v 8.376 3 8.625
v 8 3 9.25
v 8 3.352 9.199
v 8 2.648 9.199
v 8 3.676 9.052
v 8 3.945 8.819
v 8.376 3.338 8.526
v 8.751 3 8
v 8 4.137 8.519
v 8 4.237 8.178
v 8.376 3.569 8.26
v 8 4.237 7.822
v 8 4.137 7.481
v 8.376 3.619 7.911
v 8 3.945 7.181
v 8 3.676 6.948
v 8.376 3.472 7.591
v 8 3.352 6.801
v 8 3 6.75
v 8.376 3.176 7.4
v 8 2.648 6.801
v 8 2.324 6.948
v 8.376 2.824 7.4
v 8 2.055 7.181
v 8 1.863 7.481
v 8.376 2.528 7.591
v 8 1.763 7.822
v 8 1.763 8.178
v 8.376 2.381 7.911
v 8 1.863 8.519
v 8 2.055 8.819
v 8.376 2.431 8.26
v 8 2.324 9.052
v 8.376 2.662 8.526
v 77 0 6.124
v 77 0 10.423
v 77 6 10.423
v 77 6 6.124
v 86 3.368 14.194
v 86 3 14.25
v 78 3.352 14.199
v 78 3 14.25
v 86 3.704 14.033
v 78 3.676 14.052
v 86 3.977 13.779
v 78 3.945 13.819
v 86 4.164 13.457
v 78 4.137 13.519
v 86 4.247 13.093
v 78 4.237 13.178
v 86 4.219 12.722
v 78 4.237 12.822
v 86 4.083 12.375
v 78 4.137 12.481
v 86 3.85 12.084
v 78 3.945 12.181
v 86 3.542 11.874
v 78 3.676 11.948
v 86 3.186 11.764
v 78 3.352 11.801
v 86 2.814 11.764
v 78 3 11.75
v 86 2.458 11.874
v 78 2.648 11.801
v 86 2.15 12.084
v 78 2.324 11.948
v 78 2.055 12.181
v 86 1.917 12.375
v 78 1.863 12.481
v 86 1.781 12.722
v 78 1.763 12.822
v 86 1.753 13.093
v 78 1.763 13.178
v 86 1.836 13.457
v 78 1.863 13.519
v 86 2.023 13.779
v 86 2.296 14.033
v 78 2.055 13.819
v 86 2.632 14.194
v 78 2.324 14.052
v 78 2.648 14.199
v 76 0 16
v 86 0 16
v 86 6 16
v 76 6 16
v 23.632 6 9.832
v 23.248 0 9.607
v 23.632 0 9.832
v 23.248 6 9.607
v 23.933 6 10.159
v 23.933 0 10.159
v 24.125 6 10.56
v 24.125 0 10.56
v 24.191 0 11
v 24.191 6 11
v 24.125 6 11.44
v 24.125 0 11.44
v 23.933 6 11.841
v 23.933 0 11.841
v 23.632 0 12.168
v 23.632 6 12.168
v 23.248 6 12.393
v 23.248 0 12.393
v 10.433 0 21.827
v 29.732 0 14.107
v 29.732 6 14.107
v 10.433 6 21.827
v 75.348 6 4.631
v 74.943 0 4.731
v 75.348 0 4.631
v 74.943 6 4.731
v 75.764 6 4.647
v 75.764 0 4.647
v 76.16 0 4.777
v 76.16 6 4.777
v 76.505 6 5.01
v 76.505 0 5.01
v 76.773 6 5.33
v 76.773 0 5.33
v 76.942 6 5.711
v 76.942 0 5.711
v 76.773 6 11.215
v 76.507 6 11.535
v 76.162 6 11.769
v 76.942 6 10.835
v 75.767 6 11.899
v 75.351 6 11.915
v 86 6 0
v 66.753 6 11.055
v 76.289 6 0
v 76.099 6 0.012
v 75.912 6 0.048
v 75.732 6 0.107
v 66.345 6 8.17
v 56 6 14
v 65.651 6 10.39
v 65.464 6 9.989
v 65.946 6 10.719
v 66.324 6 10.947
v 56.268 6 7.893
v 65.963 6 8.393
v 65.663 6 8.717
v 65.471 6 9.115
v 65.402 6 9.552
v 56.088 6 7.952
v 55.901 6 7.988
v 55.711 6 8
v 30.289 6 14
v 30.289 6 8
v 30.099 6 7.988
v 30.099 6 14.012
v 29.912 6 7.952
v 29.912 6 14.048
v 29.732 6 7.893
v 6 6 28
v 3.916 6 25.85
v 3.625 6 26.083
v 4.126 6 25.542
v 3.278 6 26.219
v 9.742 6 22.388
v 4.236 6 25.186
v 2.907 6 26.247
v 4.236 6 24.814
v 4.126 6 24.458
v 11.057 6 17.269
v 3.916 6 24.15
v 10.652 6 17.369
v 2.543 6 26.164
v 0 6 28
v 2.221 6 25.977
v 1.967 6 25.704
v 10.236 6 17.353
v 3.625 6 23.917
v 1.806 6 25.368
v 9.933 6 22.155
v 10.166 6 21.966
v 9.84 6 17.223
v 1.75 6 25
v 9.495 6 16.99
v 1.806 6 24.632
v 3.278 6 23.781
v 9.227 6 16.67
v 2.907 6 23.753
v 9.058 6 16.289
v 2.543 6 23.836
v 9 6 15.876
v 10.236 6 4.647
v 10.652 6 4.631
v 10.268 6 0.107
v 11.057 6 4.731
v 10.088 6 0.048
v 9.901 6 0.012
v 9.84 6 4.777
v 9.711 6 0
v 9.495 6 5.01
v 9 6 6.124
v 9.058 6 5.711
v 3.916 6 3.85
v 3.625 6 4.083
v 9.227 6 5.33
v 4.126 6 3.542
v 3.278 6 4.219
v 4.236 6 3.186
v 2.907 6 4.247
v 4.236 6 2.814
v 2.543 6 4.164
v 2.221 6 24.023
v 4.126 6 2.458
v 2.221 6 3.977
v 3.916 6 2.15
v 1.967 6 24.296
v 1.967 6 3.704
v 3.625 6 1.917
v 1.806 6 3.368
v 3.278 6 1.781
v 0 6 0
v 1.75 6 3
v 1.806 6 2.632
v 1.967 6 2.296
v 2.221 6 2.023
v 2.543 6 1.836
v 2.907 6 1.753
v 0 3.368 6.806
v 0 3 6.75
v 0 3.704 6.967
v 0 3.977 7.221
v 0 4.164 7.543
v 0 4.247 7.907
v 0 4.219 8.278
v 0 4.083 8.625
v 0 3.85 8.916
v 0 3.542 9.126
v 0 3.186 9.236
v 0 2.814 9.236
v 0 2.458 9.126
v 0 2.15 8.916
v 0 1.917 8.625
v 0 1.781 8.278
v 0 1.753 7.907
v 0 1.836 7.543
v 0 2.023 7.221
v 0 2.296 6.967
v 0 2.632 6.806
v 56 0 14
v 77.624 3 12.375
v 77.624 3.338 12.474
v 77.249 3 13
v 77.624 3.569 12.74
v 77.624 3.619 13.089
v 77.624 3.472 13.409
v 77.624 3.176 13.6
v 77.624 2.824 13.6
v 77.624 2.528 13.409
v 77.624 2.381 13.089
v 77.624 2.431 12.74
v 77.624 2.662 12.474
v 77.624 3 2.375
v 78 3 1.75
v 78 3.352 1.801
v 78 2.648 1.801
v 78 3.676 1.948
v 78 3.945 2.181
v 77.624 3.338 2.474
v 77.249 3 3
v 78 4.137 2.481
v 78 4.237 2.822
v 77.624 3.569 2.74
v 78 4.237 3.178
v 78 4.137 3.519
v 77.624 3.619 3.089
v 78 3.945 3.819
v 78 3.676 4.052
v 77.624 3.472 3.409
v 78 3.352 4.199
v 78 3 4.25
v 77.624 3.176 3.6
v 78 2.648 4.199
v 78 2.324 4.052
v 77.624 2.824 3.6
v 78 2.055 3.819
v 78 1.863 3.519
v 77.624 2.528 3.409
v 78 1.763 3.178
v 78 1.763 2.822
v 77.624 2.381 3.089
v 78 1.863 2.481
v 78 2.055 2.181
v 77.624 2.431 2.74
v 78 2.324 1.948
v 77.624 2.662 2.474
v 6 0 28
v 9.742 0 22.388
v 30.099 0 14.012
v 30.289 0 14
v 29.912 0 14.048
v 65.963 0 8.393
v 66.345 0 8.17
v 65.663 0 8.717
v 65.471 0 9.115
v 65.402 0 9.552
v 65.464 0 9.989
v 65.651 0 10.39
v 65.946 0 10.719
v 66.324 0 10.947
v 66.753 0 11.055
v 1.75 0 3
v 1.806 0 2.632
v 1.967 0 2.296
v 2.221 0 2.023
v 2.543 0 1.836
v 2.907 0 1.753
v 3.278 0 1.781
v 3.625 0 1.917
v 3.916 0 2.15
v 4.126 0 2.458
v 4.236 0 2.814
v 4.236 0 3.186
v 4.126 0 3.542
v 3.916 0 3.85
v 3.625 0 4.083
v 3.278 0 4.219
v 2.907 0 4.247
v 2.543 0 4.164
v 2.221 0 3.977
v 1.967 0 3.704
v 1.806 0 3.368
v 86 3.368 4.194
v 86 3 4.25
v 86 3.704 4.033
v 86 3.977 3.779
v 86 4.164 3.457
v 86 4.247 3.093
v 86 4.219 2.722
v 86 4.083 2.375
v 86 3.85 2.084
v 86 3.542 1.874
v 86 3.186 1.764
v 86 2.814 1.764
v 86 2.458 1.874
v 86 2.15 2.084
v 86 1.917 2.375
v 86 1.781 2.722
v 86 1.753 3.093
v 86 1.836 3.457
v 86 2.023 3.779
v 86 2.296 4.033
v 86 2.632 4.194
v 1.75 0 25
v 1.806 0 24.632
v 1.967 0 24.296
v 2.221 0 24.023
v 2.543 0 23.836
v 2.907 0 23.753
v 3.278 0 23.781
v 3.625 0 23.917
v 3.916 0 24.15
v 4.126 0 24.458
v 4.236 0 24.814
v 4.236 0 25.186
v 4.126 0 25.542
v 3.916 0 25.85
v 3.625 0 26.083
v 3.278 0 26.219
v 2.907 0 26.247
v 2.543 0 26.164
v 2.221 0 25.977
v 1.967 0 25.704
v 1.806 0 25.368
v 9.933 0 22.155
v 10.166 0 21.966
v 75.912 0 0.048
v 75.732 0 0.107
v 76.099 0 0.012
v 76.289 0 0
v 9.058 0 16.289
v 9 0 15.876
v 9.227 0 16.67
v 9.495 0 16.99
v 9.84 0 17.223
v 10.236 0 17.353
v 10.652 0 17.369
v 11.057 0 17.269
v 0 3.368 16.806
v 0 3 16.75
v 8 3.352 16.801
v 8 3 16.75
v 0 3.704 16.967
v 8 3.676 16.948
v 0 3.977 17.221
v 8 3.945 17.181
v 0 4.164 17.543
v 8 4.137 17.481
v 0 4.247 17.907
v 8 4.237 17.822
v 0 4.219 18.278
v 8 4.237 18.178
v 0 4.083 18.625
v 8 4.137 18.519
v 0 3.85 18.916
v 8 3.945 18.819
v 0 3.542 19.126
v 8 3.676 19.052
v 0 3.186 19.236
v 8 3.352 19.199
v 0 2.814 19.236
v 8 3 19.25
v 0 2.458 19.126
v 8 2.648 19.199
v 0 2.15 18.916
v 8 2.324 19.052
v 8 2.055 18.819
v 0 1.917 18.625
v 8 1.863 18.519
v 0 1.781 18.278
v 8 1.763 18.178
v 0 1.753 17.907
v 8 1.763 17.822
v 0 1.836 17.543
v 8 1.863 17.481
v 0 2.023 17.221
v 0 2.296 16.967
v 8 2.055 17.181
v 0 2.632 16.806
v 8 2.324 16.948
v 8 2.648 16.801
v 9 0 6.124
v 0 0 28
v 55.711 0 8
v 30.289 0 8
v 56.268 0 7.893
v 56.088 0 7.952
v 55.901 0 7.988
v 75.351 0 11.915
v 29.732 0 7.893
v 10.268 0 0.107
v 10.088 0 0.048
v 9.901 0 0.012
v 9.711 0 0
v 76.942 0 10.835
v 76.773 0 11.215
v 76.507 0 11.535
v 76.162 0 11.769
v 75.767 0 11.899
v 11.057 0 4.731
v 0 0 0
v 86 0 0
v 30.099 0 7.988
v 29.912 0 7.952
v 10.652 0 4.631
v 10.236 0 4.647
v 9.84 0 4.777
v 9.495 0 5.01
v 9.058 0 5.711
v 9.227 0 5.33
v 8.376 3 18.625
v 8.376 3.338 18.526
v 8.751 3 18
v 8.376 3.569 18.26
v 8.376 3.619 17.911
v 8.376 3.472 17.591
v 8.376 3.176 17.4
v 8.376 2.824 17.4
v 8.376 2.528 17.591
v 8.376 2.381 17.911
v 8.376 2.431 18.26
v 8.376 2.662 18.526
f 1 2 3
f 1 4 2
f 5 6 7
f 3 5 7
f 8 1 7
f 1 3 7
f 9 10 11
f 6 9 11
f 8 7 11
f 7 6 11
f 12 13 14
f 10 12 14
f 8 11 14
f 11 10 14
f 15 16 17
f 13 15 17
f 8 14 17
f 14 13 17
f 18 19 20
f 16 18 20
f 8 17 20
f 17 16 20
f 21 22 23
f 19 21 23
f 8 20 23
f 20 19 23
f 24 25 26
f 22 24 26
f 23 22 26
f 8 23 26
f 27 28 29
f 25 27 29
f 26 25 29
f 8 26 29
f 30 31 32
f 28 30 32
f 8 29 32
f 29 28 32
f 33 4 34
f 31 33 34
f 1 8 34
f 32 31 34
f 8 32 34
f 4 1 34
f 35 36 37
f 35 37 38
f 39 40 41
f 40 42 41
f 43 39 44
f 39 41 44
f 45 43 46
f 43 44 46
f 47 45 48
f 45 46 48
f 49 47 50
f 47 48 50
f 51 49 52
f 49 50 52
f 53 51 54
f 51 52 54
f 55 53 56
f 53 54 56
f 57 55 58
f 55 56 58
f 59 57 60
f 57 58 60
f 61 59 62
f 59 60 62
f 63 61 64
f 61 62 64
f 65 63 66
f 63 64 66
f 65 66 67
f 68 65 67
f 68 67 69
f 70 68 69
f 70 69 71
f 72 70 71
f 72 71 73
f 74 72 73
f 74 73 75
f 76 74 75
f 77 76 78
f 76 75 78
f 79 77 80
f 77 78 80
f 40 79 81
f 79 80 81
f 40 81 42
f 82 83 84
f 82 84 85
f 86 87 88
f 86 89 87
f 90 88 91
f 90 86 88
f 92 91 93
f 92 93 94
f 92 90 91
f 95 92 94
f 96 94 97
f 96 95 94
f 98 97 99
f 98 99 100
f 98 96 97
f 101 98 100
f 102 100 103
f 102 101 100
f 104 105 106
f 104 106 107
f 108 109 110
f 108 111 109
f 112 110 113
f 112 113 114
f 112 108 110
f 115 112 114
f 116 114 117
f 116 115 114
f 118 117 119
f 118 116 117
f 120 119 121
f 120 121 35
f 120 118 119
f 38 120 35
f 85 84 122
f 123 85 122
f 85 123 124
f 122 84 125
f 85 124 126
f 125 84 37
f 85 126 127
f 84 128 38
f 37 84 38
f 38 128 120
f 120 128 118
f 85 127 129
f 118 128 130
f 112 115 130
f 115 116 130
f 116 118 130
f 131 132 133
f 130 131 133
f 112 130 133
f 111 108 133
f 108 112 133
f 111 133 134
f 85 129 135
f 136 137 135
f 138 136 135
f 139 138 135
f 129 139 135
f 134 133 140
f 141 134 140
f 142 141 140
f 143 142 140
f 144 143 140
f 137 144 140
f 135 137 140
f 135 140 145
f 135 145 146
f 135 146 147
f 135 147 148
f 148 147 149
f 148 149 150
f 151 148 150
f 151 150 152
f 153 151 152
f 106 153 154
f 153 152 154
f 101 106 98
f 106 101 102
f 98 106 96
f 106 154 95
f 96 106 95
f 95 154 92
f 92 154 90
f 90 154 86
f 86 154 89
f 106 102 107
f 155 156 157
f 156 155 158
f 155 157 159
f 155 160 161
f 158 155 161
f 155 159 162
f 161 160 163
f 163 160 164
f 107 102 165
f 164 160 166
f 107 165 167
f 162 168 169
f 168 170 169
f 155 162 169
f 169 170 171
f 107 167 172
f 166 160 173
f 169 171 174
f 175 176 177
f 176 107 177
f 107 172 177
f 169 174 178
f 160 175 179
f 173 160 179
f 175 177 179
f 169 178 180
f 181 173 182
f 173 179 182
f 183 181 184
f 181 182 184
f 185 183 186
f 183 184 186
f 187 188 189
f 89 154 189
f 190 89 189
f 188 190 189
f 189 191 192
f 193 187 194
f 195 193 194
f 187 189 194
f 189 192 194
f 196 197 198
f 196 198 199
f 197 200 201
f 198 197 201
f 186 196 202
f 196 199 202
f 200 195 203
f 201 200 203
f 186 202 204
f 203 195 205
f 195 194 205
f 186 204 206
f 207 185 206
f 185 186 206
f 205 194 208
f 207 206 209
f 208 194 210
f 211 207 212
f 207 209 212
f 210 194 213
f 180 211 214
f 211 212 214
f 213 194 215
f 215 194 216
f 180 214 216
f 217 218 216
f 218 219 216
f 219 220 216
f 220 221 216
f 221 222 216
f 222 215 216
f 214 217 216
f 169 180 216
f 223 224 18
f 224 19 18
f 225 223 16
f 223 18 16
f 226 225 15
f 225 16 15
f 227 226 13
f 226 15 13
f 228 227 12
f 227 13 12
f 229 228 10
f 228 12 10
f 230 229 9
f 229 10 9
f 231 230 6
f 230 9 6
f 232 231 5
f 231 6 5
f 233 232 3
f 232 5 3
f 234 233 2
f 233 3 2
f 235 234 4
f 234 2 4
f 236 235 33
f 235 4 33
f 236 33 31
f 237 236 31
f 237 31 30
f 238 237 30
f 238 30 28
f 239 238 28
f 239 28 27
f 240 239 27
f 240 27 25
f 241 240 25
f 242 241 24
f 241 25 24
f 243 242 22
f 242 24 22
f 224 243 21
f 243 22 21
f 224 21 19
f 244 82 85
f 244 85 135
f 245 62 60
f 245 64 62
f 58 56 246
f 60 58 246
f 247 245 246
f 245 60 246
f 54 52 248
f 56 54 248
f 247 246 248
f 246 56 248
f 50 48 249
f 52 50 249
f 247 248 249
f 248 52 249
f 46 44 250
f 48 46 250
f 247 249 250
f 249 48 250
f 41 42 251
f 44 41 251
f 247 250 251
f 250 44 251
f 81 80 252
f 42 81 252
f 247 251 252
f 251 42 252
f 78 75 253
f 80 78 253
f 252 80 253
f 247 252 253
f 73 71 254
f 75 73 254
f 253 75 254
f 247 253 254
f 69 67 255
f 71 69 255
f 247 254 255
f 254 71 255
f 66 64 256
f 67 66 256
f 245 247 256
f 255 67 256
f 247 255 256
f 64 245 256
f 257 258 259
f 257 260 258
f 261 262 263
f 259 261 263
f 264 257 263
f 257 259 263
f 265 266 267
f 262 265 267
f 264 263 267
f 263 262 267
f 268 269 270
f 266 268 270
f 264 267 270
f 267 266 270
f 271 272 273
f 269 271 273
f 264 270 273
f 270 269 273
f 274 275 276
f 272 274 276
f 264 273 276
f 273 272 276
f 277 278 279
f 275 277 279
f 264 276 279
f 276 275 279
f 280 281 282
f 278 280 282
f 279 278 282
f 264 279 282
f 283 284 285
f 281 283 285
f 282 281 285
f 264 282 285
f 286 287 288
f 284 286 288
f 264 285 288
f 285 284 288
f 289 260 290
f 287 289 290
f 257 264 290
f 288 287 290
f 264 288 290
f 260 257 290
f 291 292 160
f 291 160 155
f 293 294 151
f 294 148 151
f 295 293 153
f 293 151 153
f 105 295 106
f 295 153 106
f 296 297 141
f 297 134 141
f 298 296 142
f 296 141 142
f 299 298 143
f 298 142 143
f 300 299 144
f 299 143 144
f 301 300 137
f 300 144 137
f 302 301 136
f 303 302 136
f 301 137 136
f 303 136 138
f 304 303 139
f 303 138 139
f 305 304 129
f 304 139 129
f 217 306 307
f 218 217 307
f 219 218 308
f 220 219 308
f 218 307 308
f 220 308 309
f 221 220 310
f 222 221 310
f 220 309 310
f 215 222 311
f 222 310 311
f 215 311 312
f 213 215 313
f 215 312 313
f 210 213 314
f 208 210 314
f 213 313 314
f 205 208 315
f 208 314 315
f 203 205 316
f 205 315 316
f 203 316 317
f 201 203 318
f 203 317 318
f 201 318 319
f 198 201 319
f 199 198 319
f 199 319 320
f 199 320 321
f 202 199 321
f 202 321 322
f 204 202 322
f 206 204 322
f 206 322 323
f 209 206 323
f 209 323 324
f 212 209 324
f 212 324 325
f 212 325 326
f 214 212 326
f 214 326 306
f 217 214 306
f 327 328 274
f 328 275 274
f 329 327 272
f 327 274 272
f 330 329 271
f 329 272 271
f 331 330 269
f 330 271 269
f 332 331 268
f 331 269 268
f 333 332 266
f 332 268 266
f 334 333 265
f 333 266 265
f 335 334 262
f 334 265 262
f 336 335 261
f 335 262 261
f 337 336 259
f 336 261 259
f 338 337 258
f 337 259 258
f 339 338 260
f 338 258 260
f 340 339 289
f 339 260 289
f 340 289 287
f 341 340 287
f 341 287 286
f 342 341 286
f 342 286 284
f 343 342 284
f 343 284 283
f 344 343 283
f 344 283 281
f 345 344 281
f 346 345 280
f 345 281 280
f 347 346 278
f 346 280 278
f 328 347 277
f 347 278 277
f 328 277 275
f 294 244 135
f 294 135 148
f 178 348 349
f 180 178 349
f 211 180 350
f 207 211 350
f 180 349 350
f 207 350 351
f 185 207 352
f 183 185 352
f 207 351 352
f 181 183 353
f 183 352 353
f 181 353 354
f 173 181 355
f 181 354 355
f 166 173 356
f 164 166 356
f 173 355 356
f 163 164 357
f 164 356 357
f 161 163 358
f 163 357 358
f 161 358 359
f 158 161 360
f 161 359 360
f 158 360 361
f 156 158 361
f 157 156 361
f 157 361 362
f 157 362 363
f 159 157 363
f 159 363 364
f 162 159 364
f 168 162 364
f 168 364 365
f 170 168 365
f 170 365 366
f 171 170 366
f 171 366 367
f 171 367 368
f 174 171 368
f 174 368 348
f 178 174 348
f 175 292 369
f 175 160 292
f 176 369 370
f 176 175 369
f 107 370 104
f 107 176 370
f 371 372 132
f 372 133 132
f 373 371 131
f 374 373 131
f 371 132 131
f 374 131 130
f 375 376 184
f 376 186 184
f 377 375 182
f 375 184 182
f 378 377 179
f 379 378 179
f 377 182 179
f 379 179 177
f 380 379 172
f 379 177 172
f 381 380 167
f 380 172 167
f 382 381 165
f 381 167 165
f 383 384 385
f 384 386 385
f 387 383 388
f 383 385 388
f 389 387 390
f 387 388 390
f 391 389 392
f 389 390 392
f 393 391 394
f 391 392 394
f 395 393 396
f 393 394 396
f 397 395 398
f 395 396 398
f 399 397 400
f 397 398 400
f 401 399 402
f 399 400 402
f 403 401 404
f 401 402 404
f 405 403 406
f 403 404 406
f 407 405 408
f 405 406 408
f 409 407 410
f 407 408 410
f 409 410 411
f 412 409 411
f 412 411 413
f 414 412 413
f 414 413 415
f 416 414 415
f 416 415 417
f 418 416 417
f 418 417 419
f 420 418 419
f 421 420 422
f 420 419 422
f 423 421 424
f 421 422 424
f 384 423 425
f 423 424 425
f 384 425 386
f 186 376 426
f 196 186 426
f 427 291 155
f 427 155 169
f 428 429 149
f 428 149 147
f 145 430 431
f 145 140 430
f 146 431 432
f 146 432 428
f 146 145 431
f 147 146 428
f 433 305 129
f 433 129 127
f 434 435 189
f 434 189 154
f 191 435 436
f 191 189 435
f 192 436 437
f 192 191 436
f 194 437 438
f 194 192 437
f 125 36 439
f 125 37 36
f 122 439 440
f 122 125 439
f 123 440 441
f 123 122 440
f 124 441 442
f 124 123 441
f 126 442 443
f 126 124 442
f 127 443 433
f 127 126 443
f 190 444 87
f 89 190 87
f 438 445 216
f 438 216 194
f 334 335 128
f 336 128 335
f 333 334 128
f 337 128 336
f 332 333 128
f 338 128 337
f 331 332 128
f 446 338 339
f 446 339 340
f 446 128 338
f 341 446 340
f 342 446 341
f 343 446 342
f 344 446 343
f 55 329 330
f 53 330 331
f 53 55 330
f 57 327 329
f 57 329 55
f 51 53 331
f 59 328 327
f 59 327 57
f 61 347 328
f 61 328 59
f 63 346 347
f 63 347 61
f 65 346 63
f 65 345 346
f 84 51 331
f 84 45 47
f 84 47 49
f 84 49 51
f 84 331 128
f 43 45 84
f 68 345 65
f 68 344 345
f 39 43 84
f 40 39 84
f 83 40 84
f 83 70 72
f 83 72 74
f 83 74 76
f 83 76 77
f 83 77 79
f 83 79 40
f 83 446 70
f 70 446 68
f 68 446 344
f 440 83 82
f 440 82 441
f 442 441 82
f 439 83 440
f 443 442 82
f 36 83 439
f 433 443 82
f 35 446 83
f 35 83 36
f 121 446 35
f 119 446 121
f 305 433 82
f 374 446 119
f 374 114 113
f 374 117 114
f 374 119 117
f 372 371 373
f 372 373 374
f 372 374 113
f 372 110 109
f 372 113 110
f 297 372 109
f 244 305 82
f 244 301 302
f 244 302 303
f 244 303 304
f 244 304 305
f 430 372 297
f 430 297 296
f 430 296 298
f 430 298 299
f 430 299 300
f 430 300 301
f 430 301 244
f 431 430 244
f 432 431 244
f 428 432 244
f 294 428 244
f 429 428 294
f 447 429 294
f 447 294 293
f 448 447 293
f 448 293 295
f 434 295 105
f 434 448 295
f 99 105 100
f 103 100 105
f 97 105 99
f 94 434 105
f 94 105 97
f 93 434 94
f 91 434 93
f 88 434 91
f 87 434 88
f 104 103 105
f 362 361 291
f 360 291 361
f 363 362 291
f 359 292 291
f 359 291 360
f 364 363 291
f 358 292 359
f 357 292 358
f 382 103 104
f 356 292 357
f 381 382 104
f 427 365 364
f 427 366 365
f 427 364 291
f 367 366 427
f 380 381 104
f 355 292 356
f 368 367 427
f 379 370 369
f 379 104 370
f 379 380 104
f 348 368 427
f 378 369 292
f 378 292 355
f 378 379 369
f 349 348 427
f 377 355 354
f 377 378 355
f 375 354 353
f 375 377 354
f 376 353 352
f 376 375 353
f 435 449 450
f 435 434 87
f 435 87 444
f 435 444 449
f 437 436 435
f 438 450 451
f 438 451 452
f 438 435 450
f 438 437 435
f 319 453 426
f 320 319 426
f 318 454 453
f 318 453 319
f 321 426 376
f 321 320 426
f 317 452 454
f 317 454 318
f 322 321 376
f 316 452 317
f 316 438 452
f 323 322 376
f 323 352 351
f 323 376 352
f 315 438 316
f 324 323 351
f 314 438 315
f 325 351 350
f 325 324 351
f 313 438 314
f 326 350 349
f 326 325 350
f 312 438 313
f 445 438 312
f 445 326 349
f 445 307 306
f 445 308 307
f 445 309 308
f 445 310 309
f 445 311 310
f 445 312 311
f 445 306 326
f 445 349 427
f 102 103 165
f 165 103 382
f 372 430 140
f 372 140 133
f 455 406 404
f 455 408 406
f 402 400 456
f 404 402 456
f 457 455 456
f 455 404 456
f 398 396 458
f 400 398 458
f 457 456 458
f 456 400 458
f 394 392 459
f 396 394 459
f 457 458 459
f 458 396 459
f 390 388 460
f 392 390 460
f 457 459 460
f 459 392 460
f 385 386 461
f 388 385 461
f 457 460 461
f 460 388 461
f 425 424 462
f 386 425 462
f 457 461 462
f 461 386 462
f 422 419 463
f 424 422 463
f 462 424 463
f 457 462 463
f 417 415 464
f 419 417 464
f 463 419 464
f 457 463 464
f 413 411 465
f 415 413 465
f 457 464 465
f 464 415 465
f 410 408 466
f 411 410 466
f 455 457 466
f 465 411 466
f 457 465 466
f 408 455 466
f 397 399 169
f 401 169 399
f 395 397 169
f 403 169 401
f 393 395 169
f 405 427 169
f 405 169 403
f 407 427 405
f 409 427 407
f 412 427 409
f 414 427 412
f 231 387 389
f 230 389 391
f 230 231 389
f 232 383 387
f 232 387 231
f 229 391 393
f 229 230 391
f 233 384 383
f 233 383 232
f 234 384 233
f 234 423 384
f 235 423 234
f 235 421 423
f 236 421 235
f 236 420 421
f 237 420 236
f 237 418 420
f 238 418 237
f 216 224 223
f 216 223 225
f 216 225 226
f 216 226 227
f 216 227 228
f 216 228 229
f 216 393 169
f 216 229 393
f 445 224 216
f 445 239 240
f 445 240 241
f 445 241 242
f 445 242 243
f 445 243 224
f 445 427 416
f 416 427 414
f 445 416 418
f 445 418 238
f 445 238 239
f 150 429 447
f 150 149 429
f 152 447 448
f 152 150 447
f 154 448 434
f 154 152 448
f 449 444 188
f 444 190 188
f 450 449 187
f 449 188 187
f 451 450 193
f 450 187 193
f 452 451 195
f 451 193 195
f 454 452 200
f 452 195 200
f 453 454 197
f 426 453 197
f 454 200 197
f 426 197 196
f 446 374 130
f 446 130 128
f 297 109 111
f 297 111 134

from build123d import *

# Parameters (mm, degrees)
BOSS_EXTRUDE1_DEPTH         = 6
TAP_DRILL_FOR_M3_TAP3_D     = 2.5
TAP_DRILL_FOR_M3_TAP3_DEPTH = 10
TAP_DRILL_FOR_M3_TAP3_TIP   = 0.751075774
TAP_DRILL_FOR_M3_TAP2_D     = 2.5
TAP_DRILL_FOR_M3_TAP2_DEPTH = 8
TAP_DRILL_FOR_M3_TAP2_TIP   = 0.751075774
TAP_DRILL_FOR_M3_TAP1_D     = 2.5
TAP_DRILL_FOR_M3_TAP1_DEPTH = 8
TAP_DRILL_FOR_M3_TAP1_TIP   = 0.751075774
FILLET1_R                   = 1.5


with BuildPart() as part:
    # Sketch2 → Boss-Extrude1 (new body)
    with BuildSketch(Plane(origin=(0, 0, 0), x_dir=(1, 0, 0), z_dir=(0, 1, 0))):
        Polygon((56, -8), (76, 0), (86, 0), (86, -16), (76, -16), (56, -14), (30, -14), (10, -22), (6, -28), (0, -28), (0, 0), (10, 0), (30, -8), align=None)
        Polygon((9, -3.908131846), (26.729670386, -11), (9, -18.091868154), align=None, mode=Mode.SUBTRACT)
        Polygon((60.656164188, -10.44566617), (77, -12.080049752), (77, -3.908131846), align=None, mode=Mode.SUBTRACT)
    extrude(amount=BOSS_EXTRUDE1_DEPTH)

    # Tap Drill for M3 Tap3
    with Locations(Plane(origin=(0, 6, 0), x_dir=(1, 0, 0), z_dir=(0, 1, 0))):
        with Locations((3, -3), (3, -25)):
            Hole(TAP_DRILL_FOR_M3_TAP3_D / 2, depth=TAP_DRILL_FOR_M3_TAP3_DEPTH)
            with Locations((0, 0, -(TAP_DRILL_FOR_M3_TAP3_DEPTH + TAP_DRILL_FOR_M3_TAP3_TIP / 2))):  # 118° drill point
                Cone(0, TAP_DRILL_FOR_M3_TAP3_D / 2, TAP_DRILL_FOR_M3_TAP3_TIP, mode=Mode.SUBTRACT)

    # Tap Drill for M3 Tap2
    with Locations(Plane(origin=(86, 0.779165189, 7.640466368), x_dir=(0, 0, -1), z_dir=(1, 0, 0))):
        with Locations((-5.359533632, 2.220834811), (4.640466368, 2.220834811)):
            Hole(TAP_DRILL_FOR_M3_TAP2_D / 2, depth=TAP_DRILL_FOR_M3_TAP2_DEPTH)
            with Locations((0, 0, -(TAP_DRILL_FOR_M3_TAP2_DEPTH + TAP_DRILL_FOR_M3_TAP2_TIP / 2))):  # 118° drill point
                Cone(0, TAP_DRILL_FOR_M3_TAP2_D / 2, TAP_DRILL_FOR_M3_TAP2_TIP, mode=Mode.SUBTRACT)

    # Tap Drill for M3 Tap1
    with Locations(Plane.ZY):
        with Locations((8, 3), (18, 3)):
            Hole(TAP_DRILL_FOR_M3_TAP1_D / 2, depth=TAP_DRILL_FOR_M3_TAP1_DEPTH)
            with Locations((0, 0, -(TAP_DRILL_FOR_M3_TAP1_DEPTH + TAP_DRILL_FOR_M3_TAP1_TIP / 2))):  # 118° drill point
                Cone(0, TAP_DRILL_FOR_M3_TAP1_D / 2, TAP_DRILL_FOR_M3_TAP1_TIP, mode=Mode.SUBTRACT)

    # Fillet1
    fillet1_edges = [part.edges().sort_by_distance(p)[0] for p in [
        (10, 3, 0),
        (30, 3, 8),
        (56, 3, 8),
        (76, 3, 0),
        (30, 3, 14),
        (10, 3, 22),
        (9, 3, 18.091868154),
        (26.729670386, 3, 11),
        (9, 3, 3.908131846),
        (77, 3, 3.908131846),
        (60.656164188, 3, 10.44566617),
        (77, 3, 12.080049752),
    ]]
    fillet(fillet1_edges, radius=FILLET1_R)


solid = part.part
